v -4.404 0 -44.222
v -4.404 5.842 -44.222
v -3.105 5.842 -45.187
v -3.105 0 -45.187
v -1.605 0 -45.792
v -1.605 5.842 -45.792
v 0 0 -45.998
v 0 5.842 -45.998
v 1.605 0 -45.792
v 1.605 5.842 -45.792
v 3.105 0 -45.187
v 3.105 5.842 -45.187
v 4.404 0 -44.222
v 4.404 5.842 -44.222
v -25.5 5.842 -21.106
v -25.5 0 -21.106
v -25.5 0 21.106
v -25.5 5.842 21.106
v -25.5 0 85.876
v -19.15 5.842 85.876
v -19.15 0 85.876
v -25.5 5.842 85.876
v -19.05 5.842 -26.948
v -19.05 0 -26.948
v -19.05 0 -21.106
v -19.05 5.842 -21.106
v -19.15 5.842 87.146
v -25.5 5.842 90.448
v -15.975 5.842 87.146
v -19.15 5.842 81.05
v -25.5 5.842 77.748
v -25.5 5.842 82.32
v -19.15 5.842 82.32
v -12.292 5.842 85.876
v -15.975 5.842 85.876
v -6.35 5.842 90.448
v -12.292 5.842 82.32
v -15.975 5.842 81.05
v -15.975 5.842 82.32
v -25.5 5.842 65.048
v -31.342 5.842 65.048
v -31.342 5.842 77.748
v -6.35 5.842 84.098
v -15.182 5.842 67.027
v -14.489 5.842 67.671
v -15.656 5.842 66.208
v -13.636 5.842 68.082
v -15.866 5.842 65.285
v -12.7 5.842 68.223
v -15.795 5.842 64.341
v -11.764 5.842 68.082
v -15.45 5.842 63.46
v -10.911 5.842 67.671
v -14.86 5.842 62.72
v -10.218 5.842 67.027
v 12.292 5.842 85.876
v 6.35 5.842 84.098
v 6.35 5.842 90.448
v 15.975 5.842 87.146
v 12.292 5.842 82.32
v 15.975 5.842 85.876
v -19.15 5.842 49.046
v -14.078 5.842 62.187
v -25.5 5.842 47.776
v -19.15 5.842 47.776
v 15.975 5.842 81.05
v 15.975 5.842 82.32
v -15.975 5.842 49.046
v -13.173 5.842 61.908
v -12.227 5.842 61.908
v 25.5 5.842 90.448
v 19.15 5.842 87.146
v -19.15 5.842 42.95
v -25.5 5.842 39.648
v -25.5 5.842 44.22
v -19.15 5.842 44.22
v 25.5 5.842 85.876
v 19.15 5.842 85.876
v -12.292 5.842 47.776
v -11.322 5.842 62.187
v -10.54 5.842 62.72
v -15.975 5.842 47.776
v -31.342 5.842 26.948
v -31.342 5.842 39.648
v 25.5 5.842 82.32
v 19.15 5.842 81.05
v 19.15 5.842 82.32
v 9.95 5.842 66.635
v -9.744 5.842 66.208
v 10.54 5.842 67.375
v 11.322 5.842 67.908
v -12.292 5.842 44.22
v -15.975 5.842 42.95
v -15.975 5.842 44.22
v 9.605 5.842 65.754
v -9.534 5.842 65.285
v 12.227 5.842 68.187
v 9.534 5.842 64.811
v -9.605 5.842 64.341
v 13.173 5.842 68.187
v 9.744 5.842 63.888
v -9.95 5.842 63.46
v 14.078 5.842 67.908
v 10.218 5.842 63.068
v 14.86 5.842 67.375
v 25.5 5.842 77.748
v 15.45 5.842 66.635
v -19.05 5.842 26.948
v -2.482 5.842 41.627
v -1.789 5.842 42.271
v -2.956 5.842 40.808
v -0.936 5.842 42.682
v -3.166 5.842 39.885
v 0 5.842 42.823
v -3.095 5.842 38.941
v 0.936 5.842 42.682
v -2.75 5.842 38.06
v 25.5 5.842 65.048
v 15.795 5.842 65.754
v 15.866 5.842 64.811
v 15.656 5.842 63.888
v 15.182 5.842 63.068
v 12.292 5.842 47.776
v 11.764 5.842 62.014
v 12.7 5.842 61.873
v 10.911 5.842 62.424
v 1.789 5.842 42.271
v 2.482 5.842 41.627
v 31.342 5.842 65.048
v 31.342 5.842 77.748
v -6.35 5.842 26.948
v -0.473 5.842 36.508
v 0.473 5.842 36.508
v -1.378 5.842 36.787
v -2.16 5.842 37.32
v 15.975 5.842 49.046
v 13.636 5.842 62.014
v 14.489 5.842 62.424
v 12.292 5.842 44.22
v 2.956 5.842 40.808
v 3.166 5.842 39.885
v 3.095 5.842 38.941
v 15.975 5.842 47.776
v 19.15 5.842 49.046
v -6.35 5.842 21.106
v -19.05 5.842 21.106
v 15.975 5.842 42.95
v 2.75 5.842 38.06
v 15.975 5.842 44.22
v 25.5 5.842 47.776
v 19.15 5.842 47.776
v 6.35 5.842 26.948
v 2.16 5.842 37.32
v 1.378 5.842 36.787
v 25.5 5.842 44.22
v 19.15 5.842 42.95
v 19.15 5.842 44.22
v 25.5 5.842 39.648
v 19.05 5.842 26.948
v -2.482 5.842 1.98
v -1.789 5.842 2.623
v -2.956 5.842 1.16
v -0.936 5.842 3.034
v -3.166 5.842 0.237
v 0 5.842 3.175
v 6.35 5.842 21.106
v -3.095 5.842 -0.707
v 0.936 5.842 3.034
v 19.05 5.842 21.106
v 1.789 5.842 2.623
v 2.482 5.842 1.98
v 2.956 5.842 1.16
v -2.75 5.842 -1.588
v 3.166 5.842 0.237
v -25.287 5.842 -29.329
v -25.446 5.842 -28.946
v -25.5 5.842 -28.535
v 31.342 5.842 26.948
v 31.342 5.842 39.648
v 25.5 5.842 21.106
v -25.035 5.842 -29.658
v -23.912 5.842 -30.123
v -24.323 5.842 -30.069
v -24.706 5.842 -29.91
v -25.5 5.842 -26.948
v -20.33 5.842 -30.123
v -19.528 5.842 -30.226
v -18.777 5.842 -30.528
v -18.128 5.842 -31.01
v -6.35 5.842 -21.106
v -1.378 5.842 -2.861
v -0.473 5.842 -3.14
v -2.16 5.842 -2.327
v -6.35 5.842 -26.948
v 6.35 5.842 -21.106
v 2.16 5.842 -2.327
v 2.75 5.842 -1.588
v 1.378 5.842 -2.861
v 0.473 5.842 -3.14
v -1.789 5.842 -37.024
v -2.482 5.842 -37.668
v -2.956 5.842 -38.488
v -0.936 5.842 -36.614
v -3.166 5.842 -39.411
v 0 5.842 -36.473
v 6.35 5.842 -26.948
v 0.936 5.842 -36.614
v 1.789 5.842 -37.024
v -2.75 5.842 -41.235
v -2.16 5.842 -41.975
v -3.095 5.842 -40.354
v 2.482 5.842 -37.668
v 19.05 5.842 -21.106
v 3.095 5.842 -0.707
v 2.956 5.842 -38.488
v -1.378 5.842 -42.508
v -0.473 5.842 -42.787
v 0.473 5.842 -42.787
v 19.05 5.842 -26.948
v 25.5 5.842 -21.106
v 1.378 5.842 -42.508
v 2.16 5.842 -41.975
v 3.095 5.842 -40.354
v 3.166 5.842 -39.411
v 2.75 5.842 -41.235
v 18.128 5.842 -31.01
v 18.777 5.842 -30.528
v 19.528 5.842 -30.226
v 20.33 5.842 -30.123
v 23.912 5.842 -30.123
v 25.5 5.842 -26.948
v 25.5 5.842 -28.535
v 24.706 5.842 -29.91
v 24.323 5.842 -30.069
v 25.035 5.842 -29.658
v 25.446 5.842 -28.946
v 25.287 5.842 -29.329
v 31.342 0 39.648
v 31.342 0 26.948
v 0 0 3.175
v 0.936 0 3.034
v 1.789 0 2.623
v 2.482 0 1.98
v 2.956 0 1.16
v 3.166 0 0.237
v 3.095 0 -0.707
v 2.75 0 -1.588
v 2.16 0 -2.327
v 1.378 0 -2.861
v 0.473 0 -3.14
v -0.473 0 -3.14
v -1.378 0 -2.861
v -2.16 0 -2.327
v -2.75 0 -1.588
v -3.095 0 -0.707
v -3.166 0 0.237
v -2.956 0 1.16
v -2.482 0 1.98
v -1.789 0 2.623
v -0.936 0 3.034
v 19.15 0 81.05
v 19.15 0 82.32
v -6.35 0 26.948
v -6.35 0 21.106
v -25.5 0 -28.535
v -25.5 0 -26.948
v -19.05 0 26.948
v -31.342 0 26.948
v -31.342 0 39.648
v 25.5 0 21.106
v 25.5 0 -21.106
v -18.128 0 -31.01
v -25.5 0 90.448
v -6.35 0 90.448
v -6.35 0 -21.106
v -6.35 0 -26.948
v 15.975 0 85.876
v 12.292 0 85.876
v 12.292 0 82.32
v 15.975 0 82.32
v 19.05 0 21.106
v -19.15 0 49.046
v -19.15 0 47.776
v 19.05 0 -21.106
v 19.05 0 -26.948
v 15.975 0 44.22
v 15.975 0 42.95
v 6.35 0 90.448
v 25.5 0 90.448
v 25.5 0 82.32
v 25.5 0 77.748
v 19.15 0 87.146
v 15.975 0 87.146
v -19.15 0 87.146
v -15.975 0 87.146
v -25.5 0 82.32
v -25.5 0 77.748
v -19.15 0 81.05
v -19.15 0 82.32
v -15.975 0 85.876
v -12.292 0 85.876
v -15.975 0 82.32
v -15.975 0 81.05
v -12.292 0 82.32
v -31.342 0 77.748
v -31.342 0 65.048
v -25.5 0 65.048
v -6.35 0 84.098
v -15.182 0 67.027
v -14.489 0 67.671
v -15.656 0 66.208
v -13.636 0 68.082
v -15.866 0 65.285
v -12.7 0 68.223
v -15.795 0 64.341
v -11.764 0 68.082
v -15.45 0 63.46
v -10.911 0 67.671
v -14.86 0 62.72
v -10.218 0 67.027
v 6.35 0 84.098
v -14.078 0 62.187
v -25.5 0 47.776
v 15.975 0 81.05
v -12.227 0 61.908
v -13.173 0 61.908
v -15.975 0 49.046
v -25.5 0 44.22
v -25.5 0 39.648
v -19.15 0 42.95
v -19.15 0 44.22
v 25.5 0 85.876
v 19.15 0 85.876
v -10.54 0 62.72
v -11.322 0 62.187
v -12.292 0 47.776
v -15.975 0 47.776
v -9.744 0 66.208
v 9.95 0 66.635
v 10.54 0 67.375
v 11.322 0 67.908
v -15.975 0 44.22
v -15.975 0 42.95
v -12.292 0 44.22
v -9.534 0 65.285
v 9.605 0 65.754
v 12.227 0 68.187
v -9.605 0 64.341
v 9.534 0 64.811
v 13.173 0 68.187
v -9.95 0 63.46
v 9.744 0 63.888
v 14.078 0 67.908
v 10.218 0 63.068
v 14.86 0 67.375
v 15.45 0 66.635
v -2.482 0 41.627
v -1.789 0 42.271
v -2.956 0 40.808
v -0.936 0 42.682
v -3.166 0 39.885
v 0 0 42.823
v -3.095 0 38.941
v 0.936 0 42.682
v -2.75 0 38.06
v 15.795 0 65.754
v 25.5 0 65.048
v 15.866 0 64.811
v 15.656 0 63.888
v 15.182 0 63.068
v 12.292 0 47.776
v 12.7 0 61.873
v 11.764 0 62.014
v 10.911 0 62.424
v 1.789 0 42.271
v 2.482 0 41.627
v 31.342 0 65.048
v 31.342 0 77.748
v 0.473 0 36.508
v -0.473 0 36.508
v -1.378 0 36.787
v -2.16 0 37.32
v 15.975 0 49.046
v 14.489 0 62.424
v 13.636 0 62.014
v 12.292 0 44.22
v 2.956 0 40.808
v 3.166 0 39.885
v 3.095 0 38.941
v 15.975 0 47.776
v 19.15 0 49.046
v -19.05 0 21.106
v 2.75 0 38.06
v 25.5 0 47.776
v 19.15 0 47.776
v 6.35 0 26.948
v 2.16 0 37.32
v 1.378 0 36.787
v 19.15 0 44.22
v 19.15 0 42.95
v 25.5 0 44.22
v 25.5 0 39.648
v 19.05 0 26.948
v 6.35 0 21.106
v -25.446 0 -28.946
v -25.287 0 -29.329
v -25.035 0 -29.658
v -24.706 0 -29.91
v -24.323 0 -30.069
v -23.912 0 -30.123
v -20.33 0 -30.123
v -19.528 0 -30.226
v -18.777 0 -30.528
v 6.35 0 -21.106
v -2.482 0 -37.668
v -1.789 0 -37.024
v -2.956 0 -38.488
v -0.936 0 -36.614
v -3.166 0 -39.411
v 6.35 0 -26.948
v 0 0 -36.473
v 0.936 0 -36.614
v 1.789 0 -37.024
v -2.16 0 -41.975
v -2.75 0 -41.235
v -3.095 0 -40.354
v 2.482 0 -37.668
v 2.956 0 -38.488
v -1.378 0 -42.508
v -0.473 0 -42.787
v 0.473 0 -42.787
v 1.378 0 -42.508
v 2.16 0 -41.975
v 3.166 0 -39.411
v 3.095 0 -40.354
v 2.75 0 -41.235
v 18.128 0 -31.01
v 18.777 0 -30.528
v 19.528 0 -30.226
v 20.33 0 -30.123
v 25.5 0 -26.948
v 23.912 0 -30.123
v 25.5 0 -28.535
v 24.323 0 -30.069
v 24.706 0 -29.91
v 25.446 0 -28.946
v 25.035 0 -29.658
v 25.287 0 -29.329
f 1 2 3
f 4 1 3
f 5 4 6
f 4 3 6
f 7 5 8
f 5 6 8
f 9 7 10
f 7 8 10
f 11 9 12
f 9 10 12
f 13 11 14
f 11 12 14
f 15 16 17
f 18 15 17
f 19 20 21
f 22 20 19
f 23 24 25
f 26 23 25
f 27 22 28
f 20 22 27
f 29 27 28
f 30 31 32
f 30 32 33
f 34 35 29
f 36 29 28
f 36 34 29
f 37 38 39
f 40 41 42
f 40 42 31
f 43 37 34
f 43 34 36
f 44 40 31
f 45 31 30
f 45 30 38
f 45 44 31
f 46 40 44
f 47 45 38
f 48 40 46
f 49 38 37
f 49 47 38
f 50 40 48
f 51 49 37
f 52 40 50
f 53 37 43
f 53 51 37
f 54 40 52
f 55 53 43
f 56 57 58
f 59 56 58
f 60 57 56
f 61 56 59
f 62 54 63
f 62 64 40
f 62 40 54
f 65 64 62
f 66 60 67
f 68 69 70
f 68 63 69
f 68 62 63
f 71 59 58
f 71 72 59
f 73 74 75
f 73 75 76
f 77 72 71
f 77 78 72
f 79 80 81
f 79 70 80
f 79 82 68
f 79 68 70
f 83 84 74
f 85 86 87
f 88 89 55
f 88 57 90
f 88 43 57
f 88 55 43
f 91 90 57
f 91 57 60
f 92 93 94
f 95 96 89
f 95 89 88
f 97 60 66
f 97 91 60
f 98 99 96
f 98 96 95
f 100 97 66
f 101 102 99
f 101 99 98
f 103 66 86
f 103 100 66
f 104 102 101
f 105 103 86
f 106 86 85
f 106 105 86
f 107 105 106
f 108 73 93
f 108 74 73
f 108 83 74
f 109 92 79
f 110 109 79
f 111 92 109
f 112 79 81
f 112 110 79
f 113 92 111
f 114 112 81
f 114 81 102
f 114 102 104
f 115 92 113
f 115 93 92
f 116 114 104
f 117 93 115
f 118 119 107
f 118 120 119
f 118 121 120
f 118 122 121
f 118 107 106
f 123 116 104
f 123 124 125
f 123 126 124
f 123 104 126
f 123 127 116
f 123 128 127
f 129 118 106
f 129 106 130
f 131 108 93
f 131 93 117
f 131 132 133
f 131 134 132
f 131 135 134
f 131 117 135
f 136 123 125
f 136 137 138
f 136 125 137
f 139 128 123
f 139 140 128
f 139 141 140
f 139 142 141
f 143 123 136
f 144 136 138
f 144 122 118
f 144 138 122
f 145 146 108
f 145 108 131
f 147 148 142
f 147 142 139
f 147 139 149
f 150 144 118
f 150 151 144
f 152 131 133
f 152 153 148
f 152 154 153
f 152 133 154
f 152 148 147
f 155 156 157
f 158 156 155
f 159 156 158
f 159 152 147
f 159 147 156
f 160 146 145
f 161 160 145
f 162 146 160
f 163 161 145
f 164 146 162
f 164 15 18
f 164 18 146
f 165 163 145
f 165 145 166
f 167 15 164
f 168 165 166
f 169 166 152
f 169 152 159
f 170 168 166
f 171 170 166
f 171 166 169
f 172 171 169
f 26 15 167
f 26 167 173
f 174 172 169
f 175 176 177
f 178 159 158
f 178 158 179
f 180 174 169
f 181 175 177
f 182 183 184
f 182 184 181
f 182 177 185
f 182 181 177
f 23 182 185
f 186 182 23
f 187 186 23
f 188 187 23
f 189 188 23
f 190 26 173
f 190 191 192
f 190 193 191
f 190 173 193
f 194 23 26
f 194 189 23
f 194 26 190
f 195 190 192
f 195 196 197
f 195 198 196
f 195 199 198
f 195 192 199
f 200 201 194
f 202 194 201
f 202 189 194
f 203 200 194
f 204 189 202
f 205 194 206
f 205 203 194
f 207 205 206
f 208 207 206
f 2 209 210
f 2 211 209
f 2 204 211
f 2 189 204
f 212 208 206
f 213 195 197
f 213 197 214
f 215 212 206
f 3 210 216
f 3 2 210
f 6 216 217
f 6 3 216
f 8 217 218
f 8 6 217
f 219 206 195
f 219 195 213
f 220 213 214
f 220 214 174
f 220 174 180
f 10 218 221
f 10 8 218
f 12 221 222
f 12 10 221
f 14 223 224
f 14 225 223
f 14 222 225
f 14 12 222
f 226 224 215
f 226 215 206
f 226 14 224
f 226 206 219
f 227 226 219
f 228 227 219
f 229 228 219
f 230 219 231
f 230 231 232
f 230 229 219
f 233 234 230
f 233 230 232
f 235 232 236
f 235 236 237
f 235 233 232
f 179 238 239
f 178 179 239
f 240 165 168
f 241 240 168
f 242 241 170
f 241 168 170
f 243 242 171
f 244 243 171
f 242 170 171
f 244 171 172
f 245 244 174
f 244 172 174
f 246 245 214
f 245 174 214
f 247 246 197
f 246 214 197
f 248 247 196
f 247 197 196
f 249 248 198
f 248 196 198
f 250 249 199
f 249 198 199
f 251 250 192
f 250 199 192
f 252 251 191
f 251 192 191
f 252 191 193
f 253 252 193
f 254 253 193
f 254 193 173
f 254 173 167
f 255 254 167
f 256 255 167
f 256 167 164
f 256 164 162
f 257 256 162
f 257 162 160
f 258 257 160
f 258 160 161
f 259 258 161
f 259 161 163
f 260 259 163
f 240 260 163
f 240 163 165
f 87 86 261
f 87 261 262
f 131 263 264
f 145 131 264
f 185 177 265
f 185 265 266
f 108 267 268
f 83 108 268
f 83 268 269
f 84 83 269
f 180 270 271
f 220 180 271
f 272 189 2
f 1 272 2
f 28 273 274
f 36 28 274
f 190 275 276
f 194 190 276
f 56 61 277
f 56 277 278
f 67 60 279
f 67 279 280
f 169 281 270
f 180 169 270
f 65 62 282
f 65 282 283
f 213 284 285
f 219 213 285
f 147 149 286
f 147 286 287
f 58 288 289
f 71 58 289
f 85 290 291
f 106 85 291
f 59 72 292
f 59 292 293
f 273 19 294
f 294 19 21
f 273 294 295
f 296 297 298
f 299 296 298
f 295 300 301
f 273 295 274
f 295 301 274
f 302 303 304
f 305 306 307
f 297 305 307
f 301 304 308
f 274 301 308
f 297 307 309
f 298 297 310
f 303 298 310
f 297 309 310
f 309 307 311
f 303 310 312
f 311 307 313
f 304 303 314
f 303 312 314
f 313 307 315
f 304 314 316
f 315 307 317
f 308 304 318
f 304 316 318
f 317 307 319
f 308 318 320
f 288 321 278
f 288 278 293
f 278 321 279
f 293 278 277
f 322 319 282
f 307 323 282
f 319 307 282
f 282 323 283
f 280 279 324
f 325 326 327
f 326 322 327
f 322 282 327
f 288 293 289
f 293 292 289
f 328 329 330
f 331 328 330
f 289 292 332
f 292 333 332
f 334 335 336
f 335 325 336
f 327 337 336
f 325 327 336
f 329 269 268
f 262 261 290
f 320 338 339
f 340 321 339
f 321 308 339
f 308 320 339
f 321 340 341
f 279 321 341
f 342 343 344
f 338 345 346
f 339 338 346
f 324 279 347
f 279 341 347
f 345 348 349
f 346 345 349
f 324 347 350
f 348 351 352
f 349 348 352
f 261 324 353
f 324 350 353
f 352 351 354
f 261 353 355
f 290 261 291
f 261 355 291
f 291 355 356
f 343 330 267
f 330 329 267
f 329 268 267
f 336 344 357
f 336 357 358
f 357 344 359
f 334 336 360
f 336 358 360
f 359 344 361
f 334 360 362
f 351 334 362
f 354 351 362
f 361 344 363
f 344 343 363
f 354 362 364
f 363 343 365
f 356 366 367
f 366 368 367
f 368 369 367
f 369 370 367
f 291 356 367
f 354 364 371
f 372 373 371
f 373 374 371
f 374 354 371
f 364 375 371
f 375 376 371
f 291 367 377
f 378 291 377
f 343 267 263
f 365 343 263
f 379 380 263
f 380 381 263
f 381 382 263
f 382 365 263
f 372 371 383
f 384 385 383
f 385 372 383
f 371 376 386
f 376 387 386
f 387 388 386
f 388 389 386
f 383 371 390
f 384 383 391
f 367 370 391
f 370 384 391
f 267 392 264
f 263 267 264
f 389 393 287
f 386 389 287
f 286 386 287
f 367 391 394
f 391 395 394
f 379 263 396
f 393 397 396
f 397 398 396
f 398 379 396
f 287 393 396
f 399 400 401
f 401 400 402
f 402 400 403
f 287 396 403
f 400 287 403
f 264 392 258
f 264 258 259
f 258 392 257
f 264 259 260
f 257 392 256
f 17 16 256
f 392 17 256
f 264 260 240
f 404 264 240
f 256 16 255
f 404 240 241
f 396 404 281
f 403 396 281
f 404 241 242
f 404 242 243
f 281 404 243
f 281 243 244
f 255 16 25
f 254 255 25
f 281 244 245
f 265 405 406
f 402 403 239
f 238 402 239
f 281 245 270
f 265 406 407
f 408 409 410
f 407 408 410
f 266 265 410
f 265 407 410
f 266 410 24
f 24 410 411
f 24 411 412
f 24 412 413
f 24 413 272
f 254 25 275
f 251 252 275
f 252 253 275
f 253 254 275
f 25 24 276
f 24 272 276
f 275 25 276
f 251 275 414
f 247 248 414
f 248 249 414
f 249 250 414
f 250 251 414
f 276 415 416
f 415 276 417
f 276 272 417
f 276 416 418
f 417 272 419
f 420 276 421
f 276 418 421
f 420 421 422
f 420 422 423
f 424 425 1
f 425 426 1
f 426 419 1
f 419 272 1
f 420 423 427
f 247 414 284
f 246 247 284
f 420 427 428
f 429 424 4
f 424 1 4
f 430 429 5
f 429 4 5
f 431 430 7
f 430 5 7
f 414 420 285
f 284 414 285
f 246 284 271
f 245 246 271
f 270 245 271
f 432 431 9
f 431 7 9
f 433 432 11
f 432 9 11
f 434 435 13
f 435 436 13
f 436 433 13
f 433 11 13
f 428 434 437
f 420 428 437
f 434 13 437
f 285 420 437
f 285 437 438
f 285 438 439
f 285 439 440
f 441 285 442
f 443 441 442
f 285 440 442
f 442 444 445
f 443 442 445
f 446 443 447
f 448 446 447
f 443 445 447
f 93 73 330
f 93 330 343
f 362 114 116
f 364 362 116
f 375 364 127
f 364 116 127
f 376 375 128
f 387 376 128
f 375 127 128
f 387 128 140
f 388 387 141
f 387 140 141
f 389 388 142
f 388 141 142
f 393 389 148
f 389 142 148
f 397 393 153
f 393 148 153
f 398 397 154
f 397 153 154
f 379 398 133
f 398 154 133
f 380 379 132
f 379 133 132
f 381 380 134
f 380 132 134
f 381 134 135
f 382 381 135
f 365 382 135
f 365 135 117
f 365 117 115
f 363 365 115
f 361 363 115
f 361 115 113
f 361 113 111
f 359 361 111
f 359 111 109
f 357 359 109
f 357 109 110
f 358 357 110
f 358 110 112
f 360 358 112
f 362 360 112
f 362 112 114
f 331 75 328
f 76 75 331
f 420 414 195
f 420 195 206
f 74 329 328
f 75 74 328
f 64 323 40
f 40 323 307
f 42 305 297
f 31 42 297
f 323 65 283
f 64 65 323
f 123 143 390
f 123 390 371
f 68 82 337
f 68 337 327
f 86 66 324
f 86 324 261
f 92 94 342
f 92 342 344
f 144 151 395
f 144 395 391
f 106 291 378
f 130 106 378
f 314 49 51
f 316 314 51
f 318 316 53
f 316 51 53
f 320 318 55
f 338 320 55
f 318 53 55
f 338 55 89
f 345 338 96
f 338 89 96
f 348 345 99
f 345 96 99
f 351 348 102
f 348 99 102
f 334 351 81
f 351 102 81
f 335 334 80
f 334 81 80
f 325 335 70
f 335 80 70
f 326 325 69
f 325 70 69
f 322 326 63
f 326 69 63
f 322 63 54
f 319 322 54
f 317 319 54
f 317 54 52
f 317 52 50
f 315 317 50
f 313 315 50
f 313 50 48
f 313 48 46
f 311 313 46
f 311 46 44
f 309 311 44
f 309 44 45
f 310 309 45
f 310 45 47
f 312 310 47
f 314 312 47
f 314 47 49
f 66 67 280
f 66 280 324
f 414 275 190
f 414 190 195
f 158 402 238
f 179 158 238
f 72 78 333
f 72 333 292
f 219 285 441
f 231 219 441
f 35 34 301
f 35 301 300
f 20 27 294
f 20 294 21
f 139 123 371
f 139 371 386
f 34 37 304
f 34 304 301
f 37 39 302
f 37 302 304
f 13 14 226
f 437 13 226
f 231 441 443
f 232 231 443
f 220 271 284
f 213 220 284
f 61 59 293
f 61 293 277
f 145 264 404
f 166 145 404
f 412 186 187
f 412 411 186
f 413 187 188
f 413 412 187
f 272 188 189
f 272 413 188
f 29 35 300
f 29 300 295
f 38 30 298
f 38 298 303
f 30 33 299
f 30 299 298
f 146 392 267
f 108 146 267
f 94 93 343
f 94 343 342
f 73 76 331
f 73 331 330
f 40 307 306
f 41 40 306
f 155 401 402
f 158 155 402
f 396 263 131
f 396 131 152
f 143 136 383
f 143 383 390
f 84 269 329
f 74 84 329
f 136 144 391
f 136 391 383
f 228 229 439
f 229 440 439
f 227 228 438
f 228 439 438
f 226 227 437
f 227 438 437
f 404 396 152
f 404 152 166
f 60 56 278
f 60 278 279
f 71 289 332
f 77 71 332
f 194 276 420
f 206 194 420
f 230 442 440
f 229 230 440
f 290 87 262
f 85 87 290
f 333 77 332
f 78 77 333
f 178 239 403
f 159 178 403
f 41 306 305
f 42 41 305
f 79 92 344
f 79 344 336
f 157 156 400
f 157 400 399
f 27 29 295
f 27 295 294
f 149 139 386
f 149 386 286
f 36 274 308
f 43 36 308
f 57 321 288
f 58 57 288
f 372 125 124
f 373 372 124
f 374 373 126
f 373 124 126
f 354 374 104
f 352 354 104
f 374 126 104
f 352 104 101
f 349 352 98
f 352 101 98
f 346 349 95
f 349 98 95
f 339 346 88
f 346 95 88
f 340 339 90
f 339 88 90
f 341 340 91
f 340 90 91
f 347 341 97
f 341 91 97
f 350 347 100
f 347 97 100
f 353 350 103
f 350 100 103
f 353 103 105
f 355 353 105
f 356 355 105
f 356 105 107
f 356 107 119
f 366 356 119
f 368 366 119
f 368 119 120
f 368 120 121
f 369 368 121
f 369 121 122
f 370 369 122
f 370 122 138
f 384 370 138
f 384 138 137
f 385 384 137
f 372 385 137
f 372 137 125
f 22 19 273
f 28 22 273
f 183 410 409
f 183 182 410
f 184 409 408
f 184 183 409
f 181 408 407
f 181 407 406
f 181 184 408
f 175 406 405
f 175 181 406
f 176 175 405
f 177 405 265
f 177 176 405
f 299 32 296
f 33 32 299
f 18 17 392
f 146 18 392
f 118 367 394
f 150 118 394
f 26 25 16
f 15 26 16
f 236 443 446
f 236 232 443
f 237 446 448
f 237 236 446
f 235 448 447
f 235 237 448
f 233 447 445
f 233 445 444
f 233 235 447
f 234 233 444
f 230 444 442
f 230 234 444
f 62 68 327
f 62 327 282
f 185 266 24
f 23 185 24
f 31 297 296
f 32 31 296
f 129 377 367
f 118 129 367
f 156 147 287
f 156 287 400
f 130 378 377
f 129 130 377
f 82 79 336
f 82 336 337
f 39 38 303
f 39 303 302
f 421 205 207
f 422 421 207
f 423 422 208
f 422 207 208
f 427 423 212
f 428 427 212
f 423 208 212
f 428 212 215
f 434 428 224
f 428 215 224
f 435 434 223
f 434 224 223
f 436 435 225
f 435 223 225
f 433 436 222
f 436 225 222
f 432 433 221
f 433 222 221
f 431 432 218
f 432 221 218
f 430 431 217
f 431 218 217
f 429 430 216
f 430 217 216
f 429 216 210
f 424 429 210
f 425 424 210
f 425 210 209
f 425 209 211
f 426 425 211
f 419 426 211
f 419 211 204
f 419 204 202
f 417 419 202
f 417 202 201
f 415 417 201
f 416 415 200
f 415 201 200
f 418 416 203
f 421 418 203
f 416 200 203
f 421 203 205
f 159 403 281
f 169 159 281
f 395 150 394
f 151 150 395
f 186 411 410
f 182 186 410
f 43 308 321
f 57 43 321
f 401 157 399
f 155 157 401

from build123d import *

# Parameters (mm, degrees)
SKETCH1_W           = 12.7
SKETCH1_H           = 5.842
BOSS_EXTRUDE1_DEPTH = 5.842
FILLET1_R           = 1.5875
CUT_EXTRUDE1_DEPTH  = 96.902317244
SKETCH3_R           = 3.175
CUT_EXTRUDE2_DEPTH  = 96.902317244
SKETCH4_R           = 3.175
BOSS_EXTRUDE2_DEPTH = 5.842
FILLET2_R           = 3.175


with BuildPart() as part:
    # Sketch1 → Boss-Extrude1 (new body)
    with BuildSketch(Plane(origin=(0, 0, 0), x_dir=(1, 0, 0), z_dir=(0, 1, 0))):
        Polygon((19.05, -21.1058), (25.5, -21.1058), (25.5, 21.1058), (19.05, 21.1058), (19.05, 26.9478), (25.5, 26.9478), (25.5, 30.1228), (-25.5, 30.1228), (-25.5, 26.9478), (-19.05, 26.9478), (-19.05, 21.1058), (-25.5, 21.1058), (-25.5, -21.1058), (-19.05, -21.1058), (-19.05, -26.9478), (-25.5, -26.9478), (-31.342, -26.9478), (-31.342, -39.6478), (-25.5, -39.6478), (-25.5, -65.0478), (-31.342, -65.0478), (-31.342, -77.7478), (-25.5, -77.7478), (-25.5, -90.4478), (-6.35, -90.4478), (-6.35, -84.0978), (6.35, -84.0978), (6.35, -90.4478), (25.5, -90.4478), (25.5, -77.7478), (31.342, -77.7478), (31.342, -65.0478), (25.5, -65.0478), (25.5, -39.6478), (31.342, -39.6478), (31.342, -26.9478), (25.5, -26.9478), (19.05, -26.9478), align=None)
        with Locations((0, -24.0268)):
            Rectangle(SKETCH1_W, SKETCH1_H, mode=Mode.SUBTRACT)
        with Locations((0, 24.0268)):
            Rectangle(SKETCH1_W, SKETCH1_H, mode=Mode.SUBTRACT)
    extrude(amount=BOSS_EXTRUDE1_DEPTH)

    # Fillet1
    fillet1_edges = [part.edges().sort_by_distance(p)[0] for p in [
        (-25.5, 2.921, -30.1228),
        (25.5, 2.921, -30.1228),
    ]]
    fillet(fillet1_edges, radius=FILLET1_R)

    # Sketch2 → Cut-Extrude1 (cut, through all)
    with BuildSketch(Plane(origin=(0, 5.842, 0), x_dir=(1, 0, 0), z_dir=(0, 1, 0))):
        Polygon((-19.15, -44.2198), (-19.15, -42.9498), (-15.975, -42.9498), (-15.975, -44.2198), (-12.292, -44.2198), (-12.292, -47.7758), (-15.975, -47.7758), (-15.975, -49.0458), (-19.15, -49.0458), (-19.15, -47.7758), (-25.5, -47.7758), (-25.5, -44.2198), align=None)
        Polygon((12.292, -44.2198), (15.975, -44.2198), (15.975, -42.9498), (19.15, -42.9498), (19.15, -44.2198), (25.5, -44.2198), (25.5, -47.7758), (19.15, -47.7758), (19.15, -49.0458), (15.975, -49.0458), (15.975, -47.7758), (12.292, -47.7758), align=None)
        Polygon((19.15, -85.8758), (19.15, -87.1458), (15.975, -87.1458), (15.975, -85.8758), (12.292, -85.8758), (12.292, -82.3198), (15.975, -82.3198), (15.975, -81.0498), (19.15, -81.0498), (19.15, -82.3198), (25.5, -82.3198), (25.5, -85.8758), align=None)
        Polygon((-12.292, -85.8758), (-15.975, -85.8758), (-15.975, -87.1458), (-19.15, -87.1458), (-19.15, -85.8758), (-25.5, -85.8758), (-25.5, -82.3198), (-19.15, -82.3198), (-19.15, -81.0498), (-15.975, -81.0498), (-15.975, -82.3198), (-12.292, -82.3198), align=None)
    extrude(amount=-CUT_EXTRUDE1_DEPTH, mode=Mode.SUBTRACT)

    # Sketch3 → Cut-Extrude2 (cut, through all)
    with BuildSketch(Plane(origin=(0, 5.842, 0), x_dir=(1, 0, 0), z_dir=(0, 1, 0))):
        with Locations(Location((0, 0, 0), (0, 0, 270))):
            Circle(SKETCH3_R)
        with Locations(Location((-12.7, -65.0478, 0), (0, 0, 270))):
            Circle(SKETCH3_R)
        with Locations(Location((12.7, -65.0478, 0), (0, 0, 90))):
            Circle(SKETCH3_R)
        with Locations(Location((0, -39.6478, 0), (0, 0, 270))):
            Circle(SKETCH3_R)
    extrude(amount=-CUT_EXTRUDE2_DEPTH, mode=Mode.SUBTRACT)

    # Sketch4 → Boss-Extrude2 (add)
    with BuildSketch(Plane(origin=(0, 5.842, 0), x_dir=(1, 0, 0), z_dir=(0, 1, 0))):
        with BuildLine():
            Line((-19.05, 30.1228), (-4.403989261, 44.222445188))
            ThreePointArc((-4.403989261, 44.222445188), (0, 45.9978), (4.403989261, 44.222445188))
            Line((4.403989261, 44.222445188), (19.05, 30.1228))
            Line((19.05, 30.1228), (-19.05, 30.1228))
        make_face()
        with Locations(Location((0, 39.6478, 0), (0, 0, 270))):
            Circle(SKETCH4_R, mode=Mode.SUBTRACT)
    extrude(amount=-BOSS_EXTRUDE2_DEPTH)

    # Fillet2
    fillet2_edges = [part.edges().sort_by_distance(p)[0] for p in [
        (-19.05, 2.921, -30.1228),
        (19.05, 2.921, -30.1228),
    ]]
    fillet(fillet2_edges, radius=FILLET2_R)


solid = part.part
